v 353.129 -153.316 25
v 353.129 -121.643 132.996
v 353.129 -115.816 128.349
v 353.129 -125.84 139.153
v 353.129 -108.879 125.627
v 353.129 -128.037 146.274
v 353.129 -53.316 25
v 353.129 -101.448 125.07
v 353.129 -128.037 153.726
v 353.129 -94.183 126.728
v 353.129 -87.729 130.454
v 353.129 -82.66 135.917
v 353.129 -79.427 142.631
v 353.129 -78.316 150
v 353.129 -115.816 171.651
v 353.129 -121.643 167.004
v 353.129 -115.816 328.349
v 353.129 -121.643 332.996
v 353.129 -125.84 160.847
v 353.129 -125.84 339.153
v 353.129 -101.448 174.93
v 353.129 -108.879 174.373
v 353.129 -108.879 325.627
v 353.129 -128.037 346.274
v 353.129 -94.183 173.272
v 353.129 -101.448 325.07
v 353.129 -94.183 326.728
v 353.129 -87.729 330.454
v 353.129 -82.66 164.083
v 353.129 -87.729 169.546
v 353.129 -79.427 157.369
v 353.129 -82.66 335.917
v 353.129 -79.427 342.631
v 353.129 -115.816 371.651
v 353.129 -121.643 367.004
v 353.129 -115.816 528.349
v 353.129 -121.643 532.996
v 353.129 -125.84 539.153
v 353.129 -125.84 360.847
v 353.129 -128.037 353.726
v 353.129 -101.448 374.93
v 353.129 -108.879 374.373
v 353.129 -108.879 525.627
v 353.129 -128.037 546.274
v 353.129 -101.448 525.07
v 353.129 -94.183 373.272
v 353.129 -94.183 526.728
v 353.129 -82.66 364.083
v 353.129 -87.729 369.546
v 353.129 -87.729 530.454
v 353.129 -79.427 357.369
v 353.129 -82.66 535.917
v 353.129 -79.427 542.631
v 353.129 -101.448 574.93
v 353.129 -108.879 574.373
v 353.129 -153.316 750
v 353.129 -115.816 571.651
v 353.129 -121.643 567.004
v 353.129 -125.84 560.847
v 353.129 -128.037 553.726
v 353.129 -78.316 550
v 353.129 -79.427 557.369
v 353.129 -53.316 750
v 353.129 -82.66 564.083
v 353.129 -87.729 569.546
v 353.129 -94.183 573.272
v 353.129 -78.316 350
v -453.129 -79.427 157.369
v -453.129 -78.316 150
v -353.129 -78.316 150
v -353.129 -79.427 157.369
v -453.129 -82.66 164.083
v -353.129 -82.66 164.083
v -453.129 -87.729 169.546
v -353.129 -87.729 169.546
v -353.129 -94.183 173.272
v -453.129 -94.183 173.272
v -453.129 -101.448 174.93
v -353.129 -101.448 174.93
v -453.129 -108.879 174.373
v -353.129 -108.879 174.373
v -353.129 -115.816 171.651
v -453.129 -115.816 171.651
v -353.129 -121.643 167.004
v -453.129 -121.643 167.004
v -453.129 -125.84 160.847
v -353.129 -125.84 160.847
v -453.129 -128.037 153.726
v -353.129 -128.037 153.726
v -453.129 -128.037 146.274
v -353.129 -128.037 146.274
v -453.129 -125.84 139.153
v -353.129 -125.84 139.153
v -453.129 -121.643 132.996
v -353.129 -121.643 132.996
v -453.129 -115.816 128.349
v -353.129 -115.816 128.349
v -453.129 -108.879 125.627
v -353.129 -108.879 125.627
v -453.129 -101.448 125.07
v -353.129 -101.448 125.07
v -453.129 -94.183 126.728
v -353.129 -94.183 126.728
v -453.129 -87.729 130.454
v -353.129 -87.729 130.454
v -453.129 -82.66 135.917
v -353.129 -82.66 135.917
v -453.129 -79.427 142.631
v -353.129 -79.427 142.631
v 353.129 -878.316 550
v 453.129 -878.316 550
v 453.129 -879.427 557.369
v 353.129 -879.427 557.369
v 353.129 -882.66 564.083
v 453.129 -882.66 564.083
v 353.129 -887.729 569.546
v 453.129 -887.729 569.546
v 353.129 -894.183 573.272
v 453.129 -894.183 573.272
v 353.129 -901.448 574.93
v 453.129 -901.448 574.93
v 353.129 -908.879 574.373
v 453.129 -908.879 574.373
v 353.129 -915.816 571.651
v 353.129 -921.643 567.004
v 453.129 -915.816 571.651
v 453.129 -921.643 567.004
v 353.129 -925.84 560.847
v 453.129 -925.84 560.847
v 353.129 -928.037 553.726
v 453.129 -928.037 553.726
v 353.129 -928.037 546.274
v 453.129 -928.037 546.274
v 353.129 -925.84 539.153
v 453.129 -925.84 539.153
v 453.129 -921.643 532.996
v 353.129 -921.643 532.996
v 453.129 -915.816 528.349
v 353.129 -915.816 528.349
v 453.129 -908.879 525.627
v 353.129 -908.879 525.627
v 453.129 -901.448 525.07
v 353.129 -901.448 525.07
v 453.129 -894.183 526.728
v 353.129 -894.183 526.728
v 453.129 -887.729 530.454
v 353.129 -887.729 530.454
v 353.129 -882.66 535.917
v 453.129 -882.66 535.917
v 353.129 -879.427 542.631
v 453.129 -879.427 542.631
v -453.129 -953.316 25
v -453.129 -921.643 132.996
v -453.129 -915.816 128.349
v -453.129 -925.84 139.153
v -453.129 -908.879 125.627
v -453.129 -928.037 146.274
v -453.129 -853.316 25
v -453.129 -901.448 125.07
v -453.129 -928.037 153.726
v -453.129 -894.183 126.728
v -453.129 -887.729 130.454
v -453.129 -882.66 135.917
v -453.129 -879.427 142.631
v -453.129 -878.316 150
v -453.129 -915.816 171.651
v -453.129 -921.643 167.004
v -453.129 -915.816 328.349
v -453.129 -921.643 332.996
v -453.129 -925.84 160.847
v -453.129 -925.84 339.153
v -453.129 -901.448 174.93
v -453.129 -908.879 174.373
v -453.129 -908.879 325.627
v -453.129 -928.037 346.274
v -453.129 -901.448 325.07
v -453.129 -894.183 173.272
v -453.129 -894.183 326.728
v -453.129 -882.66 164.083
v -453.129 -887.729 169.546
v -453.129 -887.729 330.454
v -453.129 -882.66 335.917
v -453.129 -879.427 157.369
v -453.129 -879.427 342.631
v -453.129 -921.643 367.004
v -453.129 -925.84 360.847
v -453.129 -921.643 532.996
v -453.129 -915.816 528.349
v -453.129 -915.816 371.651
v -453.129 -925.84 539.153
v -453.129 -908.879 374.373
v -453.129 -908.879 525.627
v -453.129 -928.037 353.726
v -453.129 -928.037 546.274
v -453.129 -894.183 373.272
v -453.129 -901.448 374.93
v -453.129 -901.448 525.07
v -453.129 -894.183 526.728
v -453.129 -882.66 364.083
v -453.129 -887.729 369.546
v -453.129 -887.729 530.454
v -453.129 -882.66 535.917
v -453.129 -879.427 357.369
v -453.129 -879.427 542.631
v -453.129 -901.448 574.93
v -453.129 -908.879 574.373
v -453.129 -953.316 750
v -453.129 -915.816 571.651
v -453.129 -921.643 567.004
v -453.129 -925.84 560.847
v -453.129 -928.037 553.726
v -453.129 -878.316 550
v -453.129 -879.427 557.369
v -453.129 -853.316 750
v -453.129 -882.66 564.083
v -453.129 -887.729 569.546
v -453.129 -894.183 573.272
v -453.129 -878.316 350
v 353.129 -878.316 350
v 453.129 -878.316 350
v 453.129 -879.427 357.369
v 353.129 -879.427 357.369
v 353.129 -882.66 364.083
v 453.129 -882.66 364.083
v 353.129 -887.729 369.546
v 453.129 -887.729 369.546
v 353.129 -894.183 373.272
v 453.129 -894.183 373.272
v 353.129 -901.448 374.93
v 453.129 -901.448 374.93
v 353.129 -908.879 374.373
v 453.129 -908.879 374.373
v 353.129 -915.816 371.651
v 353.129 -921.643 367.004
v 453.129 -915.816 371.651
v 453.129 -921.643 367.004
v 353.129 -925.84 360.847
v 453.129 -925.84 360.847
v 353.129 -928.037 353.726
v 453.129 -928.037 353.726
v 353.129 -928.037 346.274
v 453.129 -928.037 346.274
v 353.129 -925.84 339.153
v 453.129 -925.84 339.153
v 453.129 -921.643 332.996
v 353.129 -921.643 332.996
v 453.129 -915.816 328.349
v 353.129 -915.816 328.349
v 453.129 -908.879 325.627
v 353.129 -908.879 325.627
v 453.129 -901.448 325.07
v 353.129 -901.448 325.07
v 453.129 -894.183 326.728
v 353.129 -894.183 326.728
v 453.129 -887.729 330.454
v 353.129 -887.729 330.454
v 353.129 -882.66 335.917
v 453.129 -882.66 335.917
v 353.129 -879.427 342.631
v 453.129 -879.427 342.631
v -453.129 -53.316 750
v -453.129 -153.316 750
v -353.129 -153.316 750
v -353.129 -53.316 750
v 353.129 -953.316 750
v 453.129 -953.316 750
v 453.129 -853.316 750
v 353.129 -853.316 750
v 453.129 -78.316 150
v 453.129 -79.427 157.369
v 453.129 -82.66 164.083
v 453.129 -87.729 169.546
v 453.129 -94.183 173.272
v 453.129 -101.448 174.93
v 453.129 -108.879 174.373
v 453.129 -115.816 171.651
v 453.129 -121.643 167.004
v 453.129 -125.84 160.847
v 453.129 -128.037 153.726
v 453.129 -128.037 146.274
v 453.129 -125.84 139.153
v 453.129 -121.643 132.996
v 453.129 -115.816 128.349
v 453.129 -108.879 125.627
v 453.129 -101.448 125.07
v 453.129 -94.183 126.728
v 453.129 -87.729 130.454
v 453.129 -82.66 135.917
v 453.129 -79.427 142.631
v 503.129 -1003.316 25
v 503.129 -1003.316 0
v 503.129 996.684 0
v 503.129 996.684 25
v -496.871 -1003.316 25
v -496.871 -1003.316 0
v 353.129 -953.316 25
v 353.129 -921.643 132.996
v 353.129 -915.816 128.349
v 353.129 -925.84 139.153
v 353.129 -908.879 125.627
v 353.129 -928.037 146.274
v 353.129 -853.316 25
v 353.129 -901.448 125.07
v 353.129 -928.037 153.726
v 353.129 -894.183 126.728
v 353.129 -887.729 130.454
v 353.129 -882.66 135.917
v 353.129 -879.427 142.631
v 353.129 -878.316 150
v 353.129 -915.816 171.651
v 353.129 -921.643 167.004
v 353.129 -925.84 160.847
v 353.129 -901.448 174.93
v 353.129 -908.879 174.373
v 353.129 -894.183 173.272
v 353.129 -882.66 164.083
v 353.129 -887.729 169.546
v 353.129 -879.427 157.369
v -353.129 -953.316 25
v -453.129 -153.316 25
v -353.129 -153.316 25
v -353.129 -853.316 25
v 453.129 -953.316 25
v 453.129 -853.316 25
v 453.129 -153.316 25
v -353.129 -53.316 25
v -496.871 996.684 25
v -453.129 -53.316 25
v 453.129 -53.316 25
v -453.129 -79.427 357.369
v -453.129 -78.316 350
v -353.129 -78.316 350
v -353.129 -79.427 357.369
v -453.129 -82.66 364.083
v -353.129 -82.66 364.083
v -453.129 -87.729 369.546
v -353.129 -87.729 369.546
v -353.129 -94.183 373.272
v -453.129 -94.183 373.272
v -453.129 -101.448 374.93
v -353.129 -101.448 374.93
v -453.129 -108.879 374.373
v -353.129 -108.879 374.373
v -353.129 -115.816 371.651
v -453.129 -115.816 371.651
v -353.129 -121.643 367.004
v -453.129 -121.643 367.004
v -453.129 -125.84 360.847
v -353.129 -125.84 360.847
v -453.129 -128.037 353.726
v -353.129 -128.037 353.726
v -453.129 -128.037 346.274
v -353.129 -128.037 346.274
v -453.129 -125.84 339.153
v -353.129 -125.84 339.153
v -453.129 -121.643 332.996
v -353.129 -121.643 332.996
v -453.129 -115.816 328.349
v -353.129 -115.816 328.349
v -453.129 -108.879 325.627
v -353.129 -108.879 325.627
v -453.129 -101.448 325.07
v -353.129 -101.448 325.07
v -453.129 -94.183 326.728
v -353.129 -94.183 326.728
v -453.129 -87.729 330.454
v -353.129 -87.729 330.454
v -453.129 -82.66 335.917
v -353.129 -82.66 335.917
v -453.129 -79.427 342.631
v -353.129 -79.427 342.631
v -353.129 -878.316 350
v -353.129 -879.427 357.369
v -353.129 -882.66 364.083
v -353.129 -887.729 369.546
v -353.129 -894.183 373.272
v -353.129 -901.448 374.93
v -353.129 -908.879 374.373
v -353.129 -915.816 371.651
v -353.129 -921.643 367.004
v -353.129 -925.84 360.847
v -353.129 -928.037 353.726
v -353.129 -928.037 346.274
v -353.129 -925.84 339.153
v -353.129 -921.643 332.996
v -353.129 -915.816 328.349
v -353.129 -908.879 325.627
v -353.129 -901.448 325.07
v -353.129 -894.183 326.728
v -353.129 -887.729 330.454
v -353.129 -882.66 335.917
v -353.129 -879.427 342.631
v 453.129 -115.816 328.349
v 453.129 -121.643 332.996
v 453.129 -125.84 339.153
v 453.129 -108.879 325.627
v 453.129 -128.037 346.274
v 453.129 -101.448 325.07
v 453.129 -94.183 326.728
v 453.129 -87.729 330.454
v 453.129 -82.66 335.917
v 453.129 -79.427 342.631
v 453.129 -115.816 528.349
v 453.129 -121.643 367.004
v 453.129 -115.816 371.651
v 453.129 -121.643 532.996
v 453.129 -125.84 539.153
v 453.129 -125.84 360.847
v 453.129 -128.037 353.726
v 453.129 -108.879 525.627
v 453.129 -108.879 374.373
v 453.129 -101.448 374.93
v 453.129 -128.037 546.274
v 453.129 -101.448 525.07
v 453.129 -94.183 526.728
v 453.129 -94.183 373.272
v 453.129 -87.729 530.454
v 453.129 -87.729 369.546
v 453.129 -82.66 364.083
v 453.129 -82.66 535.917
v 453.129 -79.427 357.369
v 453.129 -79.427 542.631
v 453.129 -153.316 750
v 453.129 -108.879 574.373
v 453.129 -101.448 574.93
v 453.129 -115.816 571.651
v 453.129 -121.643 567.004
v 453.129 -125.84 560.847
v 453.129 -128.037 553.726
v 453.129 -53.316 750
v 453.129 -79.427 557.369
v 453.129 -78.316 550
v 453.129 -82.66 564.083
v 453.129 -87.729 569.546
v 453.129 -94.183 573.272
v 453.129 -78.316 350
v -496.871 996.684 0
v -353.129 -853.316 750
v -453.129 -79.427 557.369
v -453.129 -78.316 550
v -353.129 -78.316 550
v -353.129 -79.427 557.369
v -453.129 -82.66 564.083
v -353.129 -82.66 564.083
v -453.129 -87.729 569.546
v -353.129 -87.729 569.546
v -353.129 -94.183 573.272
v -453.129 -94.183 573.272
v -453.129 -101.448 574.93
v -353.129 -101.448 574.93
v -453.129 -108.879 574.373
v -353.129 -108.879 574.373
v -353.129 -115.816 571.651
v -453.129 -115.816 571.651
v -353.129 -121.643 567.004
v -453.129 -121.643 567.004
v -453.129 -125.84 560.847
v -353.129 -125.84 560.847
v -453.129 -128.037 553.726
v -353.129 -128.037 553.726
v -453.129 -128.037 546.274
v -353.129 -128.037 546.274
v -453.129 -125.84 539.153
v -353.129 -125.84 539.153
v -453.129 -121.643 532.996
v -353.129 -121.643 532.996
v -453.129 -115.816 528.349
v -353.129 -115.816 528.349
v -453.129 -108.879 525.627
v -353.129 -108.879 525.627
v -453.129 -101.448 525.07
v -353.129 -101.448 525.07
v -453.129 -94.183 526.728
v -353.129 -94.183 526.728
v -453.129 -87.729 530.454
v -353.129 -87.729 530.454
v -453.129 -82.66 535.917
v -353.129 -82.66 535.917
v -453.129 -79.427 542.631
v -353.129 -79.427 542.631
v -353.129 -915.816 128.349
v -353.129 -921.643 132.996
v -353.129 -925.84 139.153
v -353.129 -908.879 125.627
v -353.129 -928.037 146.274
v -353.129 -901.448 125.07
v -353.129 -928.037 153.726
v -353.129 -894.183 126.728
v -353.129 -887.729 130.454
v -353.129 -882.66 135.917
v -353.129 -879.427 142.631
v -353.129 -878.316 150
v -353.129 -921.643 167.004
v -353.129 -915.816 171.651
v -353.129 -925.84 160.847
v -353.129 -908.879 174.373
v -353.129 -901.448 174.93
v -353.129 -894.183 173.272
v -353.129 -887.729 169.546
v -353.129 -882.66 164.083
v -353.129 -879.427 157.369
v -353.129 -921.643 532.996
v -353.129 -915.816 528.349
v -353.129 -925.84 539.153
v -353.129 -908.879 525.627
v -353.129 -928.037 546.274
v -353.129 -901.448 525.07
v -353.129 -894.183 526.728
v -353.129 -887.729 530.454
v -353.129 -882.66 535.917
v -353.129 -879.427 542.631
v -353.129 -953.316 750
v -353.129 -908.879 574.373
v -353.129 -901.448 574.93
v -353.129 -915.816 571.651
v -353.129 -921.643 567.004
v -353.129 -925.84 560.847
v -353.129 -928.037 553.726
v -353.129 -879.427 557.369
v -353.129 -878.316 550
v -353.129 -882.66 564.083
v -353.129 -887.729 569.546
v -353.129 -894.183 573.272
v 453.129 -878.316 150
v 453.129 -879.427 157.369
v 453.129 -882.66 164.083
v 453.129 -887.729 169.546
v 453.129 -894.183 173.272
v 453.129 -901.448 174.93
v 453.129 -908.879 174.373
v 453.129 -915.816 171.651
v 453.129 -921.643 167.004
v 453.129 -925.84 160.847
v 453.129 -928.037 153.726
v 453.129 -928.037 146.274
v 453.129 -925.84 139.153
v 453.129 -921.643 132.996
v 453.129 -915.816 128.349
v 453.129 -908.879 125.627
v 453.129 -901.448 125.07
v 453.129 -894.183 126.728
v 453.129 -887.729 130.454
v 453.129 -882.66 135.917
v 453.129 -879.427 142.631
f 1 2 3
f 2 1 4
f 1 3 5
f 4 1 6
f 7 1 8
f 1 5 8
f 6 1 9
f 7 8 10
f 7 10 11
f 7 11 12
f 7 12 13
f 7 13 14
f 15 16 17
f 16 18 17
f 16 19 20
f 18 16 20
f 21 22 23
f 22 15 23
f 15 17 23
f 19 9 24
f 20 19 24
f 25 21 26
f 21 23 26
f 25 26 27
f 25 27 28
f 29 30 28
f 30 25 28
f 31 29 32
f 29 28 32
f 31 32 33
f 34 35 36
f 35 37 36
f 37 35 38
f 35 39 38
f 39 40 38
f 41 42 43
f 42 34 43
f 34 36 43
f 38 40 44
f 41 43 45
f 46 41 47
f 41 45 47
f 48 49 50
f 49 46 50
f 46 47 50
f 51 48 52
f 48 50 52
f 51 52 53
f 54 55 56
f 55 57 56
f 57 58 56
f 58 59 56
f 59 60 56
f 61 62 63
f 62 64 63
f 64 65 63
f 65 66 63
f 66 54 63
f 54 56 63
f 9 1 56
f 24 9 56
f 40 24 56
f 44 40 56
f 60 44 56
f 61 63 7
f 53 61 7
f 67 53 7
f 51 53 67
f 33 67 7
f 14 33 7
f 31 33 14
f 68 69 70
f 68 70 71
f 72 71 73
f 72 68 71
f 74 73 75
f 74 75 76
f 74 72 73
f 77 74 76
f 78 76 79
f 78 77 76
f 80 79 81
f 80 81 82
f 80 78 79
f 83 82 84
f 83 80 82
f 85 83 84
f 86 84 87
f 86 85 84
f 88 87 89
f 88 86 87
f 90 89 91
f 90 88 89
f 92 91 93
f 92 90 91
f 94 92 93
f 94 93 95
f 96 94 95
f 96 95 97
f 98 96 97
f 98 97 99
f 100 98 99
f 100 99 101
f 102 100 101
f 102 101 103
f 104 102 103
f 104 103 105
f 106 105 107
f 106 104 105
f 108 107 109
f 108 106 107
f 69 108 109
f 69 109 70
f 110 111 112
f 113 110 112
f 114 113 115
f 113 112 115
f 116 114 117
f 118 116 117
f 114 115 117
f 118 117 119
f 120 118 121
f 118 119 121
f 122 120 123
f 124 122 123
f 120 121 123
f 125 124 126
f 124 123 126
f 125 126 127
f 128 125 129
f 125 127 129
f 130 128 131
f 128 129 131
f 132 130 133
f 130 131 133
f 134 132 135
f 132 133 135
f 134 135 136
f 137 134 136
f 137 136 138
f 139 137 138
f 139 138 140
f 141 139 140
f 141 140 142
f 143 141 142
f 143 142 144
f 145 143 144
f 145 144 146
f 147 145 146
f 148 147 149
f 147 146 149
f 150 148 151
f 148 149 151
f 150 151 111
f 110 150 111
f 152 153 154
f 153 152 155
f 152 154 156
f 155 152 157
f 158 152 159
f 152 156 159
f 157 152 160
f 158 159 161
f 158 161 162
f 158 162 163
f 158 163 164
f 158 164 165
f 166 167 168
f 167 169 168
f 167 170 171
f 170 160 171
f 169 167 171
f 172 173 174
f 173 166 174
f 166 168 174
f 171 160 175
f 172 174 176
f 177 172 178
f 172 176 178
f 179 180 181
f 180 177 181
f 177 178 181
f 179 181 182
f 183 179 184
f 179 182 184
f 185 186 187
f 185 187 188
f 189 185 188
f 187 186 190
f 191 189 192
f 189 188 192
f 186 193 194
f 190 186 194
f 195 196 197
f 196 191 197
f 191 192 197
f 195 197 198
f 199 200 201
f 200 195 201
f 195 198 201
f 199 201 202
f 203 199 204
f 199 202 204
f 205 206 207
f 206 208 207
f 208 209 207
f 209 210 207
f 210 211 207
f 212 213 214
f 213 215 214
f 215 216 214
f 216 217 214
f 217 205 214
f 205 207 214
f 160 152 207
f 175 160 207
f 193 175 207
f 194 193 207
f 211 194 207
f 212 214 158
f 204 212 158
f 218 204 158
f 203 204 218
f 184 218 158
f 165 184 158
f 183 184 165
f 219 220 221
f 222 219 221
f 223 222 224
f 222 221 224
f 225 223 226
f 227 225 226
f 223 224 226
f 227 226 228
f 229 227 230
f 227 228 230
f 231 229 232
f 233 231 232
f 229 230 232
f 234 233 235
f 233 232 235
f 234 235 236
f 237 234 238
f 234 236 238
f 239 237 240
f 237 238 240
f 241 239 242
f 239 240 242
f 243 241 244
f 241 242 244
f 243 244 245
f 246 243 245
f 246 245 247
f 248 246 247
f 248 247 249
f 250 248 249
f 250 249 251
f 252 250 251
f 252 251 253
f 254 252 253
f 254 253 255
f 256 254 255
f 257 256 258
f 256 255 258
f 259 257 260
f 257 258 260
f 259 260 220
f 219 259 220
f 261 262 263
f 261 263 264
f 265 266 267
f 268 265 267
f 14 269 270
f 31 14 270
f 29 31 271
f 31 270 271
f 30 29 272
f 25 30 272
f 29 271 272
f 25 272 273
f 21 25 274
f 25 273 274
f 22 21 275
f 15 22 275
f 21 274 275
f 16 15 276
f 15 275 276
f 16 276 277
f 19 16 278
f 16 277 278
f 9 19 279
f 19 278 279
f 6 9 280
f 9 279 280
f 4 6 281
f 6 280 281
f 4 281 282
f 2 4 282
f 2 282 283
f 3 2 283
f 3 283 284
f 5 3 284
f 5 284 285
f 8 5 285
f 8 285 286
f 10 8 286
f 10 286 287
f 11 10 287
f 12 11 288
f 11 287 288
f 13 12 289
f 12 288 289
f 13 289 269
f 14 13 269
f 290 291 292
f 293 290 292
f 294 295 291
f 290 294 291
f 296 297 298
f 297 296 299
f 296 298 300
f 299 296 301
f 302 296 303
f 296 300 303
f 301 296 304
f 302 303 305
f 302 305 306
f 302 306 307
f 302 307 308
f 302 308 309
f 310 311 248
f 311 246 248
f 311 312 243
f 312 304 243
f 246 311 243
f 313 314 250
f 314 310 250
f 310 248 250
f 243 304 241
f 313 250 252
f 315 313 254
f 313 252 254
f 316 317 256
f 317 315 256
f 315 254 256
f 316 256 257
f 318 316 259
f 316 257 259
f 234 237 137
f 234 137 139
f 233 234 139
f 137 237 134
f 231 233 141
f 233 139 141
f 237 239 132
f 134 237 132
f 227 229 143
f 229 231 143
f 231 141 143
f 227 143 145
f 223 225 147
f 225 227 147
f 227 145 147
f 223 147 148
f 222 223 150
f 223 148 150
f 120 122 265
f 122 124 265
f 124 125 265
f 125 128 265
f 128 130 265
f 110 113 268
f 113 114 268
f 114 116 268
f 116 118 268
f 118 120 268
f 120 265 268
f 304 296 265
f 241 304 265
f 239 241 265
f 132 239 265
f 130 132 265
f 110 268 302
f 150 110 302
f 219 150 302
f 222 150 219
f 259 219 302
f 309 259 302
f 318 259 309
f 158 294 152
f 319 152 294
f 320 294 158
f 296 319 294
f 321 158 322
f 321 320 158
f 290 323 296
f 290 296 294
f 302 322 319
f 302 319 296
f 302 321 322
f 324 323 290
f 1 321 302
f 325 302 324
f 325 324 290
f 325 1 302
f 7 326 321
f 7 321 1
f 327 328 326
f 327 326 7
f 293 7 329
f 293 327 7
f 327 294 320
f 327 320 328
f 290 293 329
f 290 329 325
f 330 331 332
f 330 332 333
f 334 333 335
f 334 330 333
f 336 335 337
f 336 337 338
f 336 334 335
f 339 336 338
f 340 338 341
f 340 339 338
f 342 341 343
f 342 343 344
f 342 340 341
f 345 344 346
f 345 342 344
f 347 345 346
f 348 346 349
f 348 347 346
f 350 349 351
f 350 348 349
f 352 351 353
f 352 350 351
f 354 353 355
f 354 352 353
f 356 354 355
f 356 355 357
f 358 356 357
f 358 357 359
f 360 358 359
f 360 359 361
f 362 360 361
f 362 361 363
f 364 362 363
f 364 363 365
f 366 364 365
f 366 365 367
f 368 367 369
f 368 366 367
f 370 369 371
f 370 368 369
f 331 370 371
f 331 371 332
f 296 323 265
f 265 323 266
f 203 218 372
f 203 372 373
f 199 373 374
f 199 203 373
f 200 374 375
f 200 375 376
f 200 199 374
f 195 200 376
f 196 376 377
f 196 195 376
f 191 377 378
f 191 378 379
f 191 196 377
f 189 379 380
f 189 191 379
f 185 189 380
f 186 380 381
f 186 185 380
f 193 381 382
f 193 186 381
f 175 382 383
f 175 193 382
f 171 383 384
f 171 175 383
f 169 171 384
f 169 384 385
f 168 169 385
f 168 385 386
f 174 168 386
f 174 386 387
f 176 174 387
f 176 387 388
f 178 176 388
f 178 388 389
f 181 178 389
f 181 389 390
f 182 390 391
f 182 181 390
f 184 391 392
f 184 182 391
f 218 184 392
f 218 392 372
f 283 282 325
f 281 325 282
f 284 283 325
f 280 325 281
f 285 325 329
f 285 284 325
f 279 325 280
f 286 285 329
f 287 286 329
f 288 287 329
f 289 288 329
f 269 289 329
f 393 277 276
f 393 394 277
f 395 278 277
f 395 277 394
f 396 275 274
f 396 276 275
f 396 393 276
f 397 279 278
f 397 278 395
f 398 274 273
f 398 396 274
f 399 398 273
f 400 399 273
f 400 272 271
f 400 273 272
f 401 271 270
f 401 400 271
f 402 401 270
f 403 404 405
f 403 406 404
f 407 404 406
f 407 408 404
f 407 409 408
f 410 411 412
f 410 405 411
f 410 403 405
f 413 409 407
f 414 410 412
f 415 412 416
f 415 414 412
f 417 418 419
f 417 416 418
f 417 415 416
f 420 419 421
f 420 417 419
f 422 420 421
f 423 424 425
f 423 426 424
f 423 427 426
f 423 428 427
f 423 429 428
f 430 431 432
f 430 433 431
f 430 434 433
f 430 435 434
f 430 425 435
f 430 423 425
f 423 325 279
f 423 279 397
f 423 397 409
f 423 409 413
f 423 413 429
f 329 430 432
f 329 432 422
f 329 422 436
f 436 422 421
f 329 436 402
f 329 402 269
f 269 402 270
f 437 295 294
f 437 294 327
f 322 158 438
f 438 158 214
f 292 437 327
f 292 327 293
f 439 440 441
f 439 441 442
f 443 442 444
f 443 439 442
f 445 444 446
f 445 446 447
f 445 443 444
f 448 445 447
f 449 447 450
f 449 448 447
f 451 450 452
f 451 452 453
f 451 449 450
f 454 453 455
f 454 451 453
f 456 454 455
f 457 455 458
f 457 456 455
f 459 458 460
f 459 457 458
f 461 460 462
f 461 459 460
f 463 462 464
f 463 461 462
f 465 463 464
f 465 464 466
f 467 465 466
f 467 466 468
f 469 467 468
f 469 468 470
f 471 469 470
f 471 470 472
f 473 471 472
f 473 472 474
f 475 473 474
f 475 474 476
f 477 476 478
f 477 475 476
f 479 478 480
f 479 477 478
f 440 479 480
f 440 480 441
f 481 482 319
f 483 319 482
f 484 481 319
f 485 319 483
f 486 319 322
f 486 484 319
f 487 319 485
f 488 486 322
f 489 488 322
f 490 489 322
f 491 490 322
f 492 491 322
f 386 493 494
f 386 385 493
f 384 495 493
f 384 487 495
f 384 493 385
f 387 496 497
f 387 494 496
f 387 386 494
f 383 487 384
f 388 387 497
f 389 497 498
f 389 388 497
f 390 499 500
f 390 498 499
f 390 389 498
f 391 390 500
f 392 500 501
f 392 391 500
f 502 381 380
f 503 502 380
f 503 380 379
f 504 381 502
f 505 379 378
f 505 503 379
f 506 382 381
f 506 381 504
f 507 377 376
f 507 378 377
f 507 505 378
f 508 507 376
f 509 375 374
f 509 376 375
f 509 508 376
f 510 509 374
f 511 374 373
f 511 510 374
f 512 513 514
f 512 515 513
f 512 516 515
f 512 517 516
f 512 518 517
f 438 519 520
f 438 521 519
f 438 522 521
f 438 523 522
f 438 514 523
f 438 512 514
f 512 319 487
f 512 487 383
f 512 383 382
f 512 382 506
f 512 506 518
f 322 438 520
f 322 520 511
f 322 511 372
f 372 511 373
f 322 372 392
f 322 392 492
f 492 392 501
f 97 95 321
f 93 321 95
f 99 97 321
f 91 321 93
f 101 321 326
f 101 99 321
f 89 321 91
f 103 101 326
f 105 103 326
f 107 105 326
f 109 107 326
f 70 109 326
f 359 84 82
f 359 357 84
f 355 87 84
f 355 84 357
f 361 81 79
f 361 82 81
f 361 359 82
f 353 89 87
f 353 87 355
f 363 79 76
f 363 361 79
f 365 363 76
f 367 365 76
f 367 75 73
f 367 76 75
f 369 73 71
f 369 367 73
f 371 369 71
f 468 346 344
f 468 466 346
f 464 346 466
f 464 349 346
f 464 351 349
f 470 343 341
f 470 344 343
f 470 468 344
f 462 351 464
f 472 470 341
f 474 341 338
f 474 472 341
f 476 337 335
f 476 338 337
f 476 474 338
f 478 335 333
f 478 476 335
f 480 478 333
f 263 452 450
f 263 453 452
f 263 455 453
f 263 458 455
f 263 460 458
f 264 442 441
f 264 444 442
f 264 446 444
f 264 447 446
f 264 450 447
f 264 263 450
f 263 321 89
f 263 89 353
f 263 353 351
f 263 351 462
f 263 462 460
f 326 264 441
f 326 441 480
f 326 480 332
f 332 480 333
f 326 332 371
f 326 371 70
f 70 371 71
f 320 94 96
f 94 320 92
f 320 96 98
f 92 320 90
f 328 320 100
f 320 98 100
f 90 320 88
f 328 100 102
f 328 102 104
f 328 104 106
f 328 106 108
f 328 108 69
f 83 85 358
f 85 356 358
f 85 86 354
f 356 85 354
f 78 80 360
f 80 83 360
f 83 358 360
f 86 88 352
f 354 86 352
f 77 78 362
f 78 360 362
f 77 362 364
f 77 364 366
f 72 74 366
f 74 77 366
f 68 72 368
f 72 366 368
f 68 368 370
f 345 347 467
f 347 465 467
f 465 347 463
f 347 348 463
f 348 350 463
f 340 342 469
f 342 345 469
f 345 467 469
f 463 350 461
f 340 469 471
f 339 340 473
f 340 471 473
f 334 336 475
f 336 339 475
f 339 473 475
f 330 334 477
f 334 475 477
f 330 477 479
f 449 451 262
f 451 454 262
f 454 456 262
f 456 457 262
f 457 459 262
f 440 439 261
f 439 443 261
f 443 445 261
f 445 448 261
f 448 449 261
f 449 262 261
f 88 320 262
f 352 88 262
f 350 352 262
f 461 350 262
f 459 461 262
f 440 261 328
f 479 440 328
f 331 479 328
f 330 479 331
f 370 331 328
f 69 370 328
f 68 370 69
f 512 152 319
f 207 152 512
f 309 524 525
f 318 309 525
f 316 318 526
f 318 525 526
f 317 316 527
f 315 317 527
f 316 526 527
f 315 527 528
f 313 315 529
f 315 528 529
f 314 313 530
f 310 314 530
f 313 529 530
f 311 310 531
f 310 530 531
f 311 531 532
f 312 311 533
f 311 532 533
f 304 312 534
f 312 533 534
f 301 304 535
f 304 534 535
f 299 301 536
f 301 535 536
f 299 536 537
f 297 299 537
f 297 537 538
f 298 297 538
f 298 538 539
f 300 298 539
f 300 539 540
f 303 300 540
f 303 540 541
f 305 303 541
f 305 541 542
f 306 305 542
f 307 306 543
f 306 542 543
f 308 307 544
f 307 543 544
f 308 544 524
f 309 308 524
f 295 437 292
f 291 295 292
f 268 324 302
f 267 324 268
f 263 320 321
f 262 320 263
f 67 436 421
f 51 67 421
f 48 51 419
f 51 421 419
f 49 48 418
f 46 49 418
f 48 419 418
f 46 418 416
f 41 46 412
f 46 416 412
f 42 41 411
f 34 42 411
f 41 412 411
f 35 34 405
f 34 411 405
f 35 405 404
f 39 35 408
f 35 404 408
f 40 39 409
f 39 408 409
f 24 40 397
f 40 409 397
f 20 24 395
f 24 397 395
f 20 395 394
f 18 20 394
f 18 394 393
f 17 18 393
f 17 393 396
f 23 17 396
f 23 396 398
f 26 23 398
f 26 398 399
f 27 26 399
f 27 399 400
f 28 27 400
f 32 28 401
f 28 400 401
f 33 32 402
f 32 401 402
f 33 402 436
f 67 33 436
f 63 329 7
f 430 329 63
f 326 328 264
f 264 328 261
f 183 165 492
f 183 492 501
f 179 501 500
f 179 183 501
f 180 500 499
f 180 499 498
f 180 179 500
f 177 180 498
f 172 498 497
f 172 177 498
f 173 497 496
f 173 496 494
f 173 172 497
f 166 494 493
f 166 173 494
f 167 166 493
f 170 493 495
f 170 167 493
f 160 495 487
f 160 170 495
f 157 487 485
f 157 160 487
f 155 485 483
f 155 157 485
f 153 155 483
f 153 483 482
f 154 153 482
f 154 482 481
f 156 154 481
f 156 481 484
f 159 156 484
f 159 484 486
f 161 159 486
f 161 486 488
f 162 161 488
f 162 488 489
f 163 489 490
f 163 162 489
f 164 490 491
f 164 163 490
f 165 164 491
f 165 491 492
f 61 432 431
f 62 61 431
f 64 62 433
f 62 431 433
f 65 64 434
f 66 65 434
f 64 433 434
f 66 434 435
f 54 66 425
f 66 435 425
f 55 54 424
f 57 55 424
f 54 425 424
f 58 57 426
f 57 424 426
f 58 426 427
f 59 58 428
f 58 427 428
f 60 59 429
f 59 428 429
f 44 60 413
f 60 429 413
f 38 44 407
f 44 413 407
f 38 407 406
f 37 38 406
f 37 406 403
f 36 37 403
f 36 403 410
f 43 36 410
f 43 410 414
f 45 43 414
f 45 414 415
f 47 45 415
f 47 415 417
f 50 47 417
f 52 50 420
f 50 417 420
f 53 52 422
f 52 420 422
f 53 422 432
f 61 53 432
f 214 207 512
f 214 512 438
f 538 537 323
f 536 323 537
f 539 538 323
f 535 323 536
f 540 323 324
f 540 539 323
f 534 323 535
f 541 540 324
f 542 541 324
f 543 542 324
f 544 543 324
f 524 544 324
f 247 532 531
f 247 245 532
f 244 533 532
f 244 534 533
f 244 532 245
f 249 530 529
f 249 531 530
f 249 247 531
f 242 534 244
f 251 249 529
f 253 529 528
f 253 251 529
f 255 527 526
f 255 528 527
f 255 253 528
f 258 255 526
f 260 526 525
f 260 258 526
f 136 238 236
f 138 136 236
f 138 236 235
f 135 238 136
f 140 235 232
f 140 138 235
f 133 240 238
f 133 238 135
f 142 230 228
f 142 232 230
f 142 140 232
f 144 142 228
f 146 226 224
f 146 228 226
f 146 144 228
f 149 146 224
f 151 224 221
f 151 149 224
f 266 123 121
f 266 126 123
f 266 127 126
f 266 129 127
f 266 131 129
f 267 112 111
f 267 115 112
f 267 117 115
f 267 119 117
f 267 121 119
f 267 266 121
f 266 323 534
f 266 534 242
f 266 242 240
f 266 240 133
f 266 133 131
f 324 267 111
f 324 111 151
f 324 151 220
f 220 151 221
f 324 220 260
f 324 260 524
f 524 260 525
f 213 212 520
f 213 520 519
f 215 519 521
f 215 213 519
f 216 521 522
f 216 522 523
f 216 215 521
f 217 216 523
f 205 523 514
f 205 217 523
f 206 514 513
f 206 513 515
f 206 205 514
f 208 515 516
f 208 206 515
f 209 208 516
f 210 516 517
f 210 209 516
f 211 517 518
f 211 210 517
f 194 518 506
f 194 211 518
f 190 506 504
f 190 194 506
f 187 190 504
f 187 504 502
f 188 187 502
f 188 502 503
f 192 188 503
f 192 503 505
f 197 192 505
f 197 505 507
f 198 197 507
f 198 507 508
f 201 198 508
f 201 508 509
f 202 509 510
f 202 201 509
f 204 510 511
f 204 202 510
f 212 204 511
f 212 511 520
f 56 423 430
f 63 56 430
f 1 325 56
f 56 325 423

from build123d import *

# Parameters (mm, degrees)
F0_W     = 1000
F0_H     = 2000
F1_DEPTH = 25
F3_W     = 100
F3_H     = 725
F3_R     = 25
F4_DEPTH = 100


# Not quite as in the source:
# - a pattern or mirror of a feature is missing from the dataset's text; its kind, count and spacing are read off the source's solid


with BuildPart() as f1:
    # F0 (on Top) → F1 (new body)
    with BuildSketch(Plane.XY):
        with Locations((3.129221499, -3.3162072057)):
            Rectangle(F0_W, F0_H)
    extrude(amount=F1_DEPTH)

    # F3 (on offset) → F4 (join)
    with BuildSketch(Plane.YZ.offset(453.129221499)):
        with Locations((-903.3162072057, 387.5)):
            Rectangle(F3_W, F3_H)
        with Locations((-903.3162072057, 150)):
            Circle(F3_R, mode=Mode.SUBTRACT)
        with Locations((-903.3162072057, 350)):
            Circle(F3_R, mode=Mode.SUBTRACT)
        with Locations((-903.3162072057, 550)):
            Circle(F3_R, mode=Mode.SUBTRACT)
        with Locations((-103.3162072057, 387.5)):
            Rectangle(F3_W, F3_H)
        with Locations((-103.3162072057, 150)):
            Circle(F3_R, mode=Mode.SUBTRACT)
        with Locations((-103.3162072057, 350)):
            Circle(F3_R, mode=Mode.SUBTRACT)
        with Locations((-103.3162072057, 550)):
            Circle(F3_R, mode=Mode.SUBTRACT)
    f4 = extrude(amount=-F4_DEPTH)

    # F4_copies: F4 across plane
    add(f4.mirror(Plane(origin=(0, 0, 0), x_dir=(0, 0, -1), z_dir=(-1, 0, 0))))


solid = f1.part
